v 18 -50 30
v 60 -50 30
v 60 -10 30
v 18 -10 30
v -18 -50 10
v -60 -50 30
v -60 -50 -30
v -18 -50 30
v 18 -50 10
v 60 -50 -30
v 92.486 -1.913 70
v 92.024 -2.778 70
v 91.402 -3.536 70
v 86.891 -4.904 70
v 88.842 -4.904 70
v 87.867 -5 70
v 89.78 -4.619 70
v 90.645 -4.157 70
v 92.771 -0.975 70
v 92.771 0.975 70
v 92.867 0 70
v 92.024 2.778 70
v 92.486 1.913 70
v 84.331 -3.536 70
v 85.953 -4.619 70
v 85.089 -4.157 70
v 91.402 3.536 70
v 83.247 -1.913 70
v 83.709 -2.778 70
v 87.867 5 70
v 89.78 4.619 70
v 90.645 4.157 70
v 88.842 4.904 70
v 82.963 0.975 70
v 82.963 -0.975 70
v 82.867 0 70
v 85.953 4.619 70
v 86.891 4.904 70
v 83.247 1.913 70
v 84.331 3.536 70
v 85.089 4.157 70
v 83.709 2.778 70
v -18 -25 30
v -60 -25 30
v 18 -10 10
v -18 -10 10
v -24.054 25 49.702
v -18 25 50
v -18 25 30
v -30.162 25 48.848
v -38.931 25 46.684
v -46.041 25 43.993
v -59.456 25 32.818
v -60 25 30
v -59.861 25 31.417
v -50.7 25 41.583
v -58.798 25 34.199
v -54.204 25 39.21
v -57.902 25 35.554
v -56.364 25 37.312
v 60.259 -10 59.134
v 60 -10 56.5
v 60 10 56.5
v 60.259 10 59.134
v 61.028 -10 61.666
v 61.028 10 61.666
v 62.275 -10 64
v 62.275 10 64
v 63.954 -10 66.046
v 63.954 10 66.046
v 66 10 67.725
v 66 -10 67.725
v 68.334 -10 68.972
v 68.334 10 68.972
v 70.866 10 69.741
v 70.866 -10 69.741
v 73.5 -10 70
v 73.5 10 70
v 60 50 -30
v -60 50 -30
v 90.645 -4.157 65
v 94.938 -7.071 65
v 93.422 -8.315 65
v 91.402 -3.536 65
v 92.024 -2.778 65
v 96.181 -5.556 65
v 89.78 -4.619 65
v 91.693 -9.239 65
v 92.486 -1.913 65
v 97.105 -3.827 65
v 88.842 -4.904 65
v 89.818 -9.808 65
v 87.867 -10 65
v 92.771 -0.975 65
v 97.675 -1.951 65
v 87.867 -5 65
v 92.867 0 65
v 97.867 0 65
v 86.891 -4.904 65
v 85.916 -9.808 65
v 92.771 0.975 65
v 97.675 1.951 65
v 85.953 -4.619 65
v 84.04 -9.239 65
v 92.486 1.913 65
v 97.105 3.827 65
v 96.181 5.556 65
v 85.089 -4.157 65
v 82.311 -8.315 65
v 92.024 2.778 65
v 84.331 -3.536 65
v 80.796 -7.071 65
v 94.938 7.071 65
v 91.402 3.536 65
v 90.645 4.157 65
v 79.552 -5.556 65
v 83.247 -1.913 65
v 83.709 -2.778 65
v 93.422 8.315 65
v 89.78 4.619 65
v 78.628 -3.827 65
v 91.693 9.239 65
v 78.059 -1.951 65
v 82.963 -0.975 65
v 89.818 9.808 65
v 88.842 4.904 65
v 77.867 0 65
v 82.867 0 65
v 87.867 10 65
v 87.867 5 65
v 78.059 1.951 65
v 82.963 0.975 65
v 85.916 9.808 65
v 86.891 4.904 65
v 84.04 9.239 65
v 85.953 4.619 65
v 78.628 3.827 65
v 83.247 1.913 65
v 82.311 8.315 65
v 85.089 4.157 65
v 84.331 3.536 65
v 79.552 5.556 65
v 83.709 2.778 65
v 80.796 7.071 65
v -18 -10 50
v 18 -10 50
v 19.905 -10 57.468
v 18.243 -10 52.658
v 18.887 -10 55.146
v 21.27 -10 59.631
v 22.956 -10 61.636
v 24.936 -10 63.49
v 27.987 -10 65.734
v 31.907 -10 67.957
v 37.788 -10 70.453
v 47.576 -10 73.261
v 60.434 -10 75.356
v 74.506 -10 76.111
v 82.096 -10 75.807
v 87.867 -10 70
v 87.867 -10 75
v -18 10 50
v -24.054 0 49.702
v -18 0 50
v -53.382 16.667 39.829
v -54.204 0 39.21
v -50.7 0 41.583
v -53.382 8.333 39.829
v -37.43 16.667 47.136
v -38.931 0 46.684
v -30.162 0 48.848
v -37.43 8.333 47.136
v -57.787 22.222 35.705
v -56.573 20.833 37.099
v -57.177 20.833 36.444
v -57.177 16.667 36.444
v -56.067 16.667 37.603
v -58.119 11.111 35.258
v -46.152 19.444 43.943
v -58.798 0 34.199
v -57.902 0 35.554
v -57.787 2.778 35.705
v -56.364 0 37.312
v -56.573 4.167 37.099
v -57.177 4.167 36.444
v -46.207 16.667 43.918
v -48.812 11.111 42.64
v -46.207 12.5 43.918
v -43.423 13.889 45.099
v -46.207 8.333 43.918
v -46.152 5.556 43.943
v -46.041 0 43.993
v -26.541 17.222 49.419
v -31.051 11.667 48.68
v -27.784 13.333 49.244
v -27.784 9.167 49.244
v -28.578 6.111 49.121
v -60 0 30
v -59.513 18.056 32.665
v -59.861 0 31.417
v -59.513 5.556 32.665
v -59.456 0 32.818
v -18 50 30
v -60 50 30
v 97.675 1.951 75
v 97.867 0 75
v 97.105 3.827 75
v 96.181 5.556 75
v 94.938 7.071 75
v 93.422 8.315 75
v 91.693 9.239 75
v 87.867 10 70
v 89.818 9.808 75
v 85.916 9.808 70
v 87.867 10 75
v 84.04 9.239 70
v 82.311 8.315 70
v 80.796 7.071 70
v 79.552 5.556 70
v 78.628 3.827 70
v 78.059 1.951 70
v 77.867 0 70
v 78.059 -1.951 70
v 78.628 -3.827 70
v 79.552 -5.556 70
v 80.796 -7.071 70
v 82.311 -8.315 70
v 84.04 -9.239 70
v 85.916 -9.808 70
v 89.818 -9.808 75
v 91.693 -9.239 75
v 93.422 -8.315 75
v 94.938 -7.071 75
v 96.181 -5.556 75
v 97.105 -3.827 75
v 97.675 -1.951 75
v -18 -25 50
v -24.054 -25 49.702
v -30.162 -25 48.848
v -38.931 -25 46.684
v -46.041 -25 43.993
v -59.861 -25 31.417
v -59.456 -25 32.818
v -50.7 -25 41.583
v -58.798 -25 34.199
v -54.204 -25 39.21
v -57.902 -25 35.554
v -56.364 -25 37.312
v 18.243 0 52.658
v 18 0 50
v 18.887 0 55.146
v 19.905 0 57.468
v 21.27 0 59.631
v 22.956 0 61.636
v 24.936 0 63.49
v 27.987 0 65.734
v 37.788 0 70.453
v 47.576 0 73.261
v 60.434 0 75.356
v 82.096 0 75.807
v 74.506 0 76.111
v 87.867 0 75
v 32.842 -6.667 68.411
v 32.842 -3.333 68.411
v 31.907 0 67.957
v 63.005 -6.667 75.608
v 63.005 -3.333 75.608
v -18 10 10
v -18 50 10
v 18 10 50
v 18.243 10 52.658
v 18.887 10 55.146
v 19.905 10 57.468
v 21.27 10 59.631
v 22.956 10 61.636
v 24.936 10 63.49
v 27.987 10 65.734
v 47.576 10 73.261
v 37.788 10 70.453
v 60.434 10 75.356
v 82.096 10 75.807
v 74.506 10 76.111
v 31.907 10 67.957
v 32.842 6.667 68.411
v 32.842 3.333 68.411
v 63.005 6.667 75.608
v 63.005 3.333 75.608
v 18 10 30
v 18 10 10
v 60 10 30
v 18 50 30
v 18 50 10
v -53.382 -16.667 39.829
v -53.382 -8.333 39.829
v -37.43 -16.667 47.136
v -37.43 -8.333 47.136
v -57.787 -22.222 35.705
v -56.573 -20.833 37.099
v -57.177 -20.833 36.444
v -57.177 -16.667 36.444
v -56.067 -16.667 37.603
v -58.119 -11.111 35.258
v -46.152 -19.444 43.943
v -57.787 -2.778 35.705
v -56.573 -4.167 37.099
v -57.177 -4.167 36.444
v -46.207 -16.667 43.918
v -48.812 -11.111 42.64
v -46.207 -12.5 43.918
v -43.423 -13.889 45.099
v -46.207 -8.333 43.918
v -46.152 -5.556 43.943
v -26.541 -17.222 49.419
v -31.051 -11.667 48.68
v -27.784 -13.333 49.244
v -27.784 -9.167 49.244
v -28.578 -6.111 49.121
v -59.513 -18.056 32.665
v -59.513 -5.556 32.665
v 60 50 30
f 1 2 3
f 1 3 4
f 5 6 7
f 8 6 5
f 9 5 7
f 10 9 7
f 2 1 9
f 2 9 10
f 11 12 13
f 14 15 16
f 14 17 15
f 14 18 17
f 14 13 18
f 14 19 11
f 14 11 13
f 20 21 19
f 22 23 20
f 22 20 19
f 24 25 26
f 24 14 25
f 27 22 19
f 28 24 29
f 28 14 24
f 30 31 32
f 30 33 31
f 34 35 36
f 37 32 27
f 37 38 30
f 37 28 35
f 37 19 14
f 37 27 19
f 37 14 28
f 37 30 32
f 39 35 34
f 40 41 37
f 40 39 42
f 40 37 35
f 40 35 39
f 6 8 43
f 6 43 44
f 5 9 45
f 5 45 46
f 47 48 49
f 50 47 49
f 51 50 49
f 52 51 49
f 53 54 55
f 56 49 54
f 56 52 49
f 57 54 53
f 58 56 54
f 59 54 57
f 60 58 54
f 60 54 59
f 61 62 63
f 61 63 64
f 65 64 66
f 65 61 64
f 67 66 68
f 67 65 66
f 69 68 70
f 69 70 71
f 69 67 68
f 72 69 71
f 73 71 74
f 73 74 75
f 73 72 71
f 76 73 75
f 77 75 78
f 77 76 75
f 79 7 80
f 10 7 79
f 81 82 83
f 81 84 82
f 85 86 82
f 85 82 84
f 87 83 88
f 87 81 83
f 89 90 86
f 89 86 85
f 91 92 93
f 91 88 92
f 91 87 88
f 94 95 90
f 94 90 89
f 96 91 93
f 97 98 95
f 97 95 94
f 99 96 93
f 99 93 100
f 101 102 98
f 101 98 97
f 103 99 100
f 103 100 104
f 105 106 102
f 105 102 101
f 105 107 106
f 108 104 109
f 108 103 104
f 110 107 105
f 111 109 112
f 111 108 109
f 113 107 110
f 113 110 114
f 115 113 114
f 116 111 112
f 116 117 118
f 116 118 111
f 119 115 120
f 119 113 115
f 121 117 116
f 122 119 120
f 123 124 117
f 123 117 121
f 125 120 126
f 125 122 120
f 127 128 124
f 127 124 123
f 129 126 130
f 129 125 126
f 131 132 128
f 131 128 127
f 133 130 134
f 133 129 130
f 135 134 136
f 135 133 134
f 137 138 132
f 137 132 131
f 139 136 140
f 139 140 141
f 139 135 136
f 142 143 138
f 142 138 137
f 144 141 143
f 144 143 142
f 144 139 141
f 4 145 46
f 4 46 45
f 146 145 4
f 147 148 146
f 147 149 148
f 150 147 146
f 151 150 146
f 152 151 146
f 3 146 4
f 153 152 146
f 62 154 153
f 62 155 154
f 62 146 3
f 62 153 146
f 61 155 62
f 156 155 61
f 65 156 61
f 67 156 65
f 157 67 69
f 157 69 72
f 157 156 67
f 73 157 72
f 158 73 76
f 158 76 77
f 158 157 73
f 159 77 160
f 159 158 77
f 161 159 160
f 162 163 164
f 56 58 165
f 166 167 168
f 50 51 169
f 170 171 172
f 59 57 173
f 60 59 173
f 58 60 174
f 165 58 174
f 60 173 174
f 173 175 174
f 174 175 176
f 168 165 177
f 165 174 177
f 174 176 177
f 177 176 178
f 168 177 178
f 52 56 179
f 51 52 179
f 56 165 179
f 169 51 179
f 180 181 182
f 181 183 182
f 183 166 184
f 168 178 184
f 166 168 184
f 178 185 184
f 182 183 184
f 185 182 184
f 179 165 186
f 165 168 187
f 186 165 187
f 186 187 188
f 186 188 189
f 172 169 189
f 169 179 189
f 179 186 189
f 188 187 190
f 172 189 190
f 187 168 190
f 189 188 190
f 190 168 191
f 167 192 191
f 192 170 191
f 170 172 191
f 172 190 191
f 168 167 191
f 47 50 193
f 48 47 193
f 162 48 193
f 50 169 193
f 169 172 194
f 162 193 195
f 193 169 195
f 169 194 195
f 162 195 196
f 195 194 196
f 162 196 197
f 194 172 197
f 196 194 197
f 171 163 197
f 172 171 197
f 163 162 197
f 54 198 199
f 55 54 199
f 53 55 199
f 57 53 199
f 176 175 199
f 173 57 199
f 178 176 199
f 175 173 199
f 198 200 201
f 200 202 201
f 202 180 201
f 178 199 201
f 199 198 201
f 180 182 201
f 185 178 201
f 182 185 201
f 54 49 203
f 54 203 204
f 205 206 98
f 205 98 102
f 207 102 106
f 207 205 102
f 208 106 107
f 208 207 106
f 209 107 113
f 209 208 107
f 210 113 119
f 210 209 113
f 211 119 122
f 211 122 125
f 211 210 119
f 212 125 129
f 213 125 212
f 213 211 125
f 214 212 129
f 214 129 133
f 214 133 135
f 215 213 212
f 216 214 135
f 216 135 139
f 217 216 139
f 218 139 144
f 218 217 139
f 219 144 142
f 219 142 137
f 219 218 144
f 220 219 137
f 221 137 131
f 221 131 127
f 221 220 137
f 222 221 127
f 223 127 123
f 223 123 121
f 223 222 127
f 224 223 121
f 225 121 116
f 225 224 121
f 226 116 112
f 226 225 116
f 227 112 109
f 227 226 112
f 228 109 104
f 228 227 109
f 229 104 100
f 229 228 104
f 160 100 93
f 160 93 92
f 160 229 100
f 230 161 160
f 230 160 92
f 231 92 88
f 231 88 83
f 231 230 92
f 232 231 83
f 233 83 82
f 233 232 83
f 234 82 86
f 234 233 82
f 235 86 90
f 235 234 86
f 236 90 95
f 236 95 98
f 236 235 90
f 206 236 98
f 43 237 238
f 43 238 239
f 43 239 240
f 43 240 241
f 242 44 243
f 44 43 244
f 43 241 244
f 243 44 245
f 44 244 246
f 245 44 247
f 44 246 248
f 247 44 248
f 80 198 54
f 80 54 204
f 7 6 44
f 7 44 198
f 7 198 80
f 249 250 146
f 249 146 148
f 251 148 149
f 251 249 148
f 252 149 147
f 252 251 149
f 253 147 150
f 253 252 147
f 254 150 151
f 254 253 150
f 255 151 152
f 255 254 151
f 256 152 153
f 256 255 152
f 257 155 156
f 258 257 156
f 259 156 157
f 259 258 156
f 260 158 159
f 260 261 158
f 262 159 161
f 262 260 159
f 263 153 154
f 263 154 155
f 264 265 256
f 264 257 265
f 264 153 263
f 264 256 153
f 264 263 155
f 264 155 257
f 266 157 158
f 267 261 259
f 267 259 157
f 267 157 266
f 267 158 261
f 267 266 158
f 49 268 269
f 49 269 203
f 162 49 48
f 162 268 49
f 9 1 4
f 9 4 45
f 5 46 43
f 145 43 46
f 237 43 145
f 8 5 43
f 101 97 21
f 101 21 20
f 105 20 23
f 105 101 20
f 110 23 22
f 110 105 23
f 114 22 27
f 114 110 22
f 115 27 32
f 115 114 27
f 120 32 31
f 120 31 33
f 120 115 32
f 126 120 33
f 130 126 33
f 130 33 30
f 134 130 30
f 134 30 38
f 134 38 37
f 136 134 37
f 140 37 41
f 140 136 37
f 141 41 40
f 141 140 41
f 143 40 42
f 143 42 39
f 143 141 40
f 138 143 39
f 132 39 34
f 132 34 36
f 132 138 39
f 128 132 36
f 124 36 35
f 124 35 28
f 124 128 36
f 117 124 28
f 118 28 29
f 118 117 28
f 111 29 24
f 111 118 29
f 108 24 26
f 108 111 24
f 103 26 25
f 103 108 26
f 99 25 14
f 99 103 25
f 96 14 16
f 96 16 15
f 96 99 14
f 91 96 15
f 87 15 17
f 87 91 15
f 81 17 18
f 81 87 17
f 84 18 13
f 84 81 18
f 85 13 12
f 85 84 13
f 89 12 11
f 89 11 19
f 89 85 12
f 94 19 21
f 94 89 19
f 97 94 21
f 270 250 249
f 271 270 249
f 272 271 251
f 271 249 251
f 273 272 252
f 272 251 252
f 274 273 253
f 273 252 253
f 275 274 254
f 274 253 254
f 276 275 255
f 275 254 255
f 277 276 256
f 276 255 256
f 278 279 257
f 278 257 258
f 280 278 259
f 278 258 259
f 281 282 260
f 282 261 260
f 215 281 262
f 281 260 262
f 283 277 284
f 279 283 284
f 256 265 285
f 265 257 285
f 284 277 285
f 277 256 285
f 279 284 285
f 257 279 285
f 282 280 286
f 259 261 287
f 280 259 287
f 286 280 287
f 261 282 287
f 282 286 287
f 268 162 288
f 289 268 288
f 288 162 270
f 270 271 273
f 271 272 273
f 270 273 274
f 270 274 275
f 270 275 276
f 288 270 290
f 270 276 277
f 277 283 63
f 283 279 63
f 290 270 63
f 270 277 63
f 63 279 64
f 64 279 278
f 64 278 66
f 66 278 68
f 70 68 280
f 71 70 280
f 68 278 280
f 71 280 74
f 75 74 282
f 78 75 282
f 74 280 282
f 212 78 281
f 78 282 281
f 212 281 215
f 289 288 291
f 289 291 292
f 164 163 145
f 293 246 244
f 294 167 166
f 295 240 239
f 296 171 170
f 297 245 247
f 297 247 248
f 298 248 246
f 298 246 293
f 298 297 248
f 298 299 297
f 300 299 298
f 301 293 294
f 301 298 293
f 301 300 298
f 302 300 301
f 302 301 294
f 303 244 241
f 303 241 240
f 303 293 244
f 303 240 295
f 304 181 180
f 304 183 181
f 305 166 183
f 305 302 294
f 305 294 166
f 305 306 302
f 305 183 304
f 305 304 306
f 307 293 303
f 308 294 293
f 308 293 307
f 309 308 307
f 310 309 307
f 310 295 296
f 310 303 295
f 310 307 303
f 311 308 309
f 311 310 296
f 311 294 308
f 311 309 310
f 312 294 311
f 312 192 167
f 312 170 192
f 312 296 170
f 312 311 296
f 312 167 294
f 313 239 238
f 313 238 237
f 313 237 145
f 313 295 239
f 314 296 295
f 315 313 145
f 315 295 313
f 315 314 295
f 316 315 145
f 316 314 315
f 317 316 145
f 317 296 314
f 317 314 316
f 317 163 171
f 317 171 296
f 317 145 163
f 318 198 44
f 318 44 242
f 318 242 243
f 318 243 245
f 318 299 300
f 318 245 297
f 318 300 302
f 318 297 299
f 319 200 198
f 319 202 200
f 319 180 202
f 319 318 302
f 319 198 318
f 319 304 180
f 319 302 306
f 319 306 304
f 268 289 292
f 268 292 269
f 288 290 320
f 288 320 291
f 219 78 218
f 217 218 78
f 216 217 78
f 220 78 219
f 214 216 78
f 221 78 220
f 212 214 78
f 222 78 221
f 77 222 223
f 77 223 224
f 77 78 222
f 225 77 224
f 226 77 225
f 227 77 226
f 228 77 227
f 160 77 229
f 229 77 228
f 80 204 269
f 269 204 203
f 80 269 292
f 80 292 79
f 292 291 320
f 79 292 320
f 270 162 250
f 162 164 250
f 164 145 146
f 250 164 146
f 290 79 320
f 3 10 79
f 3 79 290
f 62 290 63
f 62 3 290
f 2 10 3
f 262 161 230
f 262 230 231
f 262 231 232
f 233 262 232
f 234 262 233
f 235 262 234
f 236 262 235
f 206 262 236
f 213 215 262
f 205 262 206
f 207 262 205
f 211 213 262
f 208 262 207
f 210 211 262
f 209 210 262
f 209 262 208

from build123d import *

# Parameters (mm, degrees)
F1_DEPTH = 50
F2_DEPTH = 25
F0_W     = 36
F0_H     = 20
F3_DEPTH = 10
F4_DEPTH = 10


with BuildPart() as f1:
    # F0 (on Front) → F1 (new body, symmetric)
    with BuildSketch(Plane.XZ):
        Polygon((-60, -30), (60, -30), (60, 30), (18, 30), (18, 10), (-18, 10), (-18, 30), (-60, 30), align=None)
    extrude(amount=F1_DEPTH, both=True)

    # F0 (on Front) → F2 (join, symmetric)
    with BuildSketch(Plane.XZ):
        with BuildLine():
            add(Edge.make_bspline(
                [(-60, 30), (-60, 40.4474846921), (-37.2177352662, 50), (-18, 50)],
                knots=[0, 0, 0, 0, 46.5188133985, 46.5188133985, 46.5188133985, 46.5188133985], degree=3))
            Line((-60, 30), (-18, 30))
            Line((-18, 30), (-18, 50))
        make_face()
    extrude(amount=F2_DEPTH, both=True)

    # F0 (on Front) → F3 (join, symmetric)
    with BuildSketch(Plane.XZ):
        with Locations((0, 20)):
            Rectangle(F0_W, F0_H)
    extrude(amount=F3_DEPTH, both=True)

    # F0 (on Front) → F4 (join, symmetric)
    with BuildSketch(Plane.XZ):
        with Locations((0, 40)):
            Rectangle(F0_W, F0_H)
        with BuildLine():
            Line((18, 30), (60, 30))
            Line((60, 30), (60, 56.5))
            ThreePointArc((60, 56.5), (63.954058454, 66.045941546), (73.5, 70))
            Line((73.5, 70), (87.8666490715, 70))
            Line((87.8666490715, 70), (87.8666490715, 75))
            add(Edge.make_bspline(
                [(18, 50), (18.3067479085, 75.1533858136), (72.5292141174, 78.3742428055), (87.8666490715, 75)],
                knots=[0, 0, 0, 0, 74.2047751326, 74.2047751326, 74.2047751326, 74.2047751326], degree=3))
            Line((18, 50), (18, 30))
        make_face()
    extrude(amount=F4_DEPTH, both=True)

    # F0 (on Front) → F5 (revolve)
    with BuildSketch(Plane.XZ):
        Polygon((97.8666490715, 75), (87.8666490715, 75), (87.8666490715, 70), (92.8666490715, 70), (92.8666490715, 65), (97.8666490715, 65), align=None)
    revolve(axis=Axis((87.8666490715, 0, 70), (0, 0, 1)))


solid = f1.part
